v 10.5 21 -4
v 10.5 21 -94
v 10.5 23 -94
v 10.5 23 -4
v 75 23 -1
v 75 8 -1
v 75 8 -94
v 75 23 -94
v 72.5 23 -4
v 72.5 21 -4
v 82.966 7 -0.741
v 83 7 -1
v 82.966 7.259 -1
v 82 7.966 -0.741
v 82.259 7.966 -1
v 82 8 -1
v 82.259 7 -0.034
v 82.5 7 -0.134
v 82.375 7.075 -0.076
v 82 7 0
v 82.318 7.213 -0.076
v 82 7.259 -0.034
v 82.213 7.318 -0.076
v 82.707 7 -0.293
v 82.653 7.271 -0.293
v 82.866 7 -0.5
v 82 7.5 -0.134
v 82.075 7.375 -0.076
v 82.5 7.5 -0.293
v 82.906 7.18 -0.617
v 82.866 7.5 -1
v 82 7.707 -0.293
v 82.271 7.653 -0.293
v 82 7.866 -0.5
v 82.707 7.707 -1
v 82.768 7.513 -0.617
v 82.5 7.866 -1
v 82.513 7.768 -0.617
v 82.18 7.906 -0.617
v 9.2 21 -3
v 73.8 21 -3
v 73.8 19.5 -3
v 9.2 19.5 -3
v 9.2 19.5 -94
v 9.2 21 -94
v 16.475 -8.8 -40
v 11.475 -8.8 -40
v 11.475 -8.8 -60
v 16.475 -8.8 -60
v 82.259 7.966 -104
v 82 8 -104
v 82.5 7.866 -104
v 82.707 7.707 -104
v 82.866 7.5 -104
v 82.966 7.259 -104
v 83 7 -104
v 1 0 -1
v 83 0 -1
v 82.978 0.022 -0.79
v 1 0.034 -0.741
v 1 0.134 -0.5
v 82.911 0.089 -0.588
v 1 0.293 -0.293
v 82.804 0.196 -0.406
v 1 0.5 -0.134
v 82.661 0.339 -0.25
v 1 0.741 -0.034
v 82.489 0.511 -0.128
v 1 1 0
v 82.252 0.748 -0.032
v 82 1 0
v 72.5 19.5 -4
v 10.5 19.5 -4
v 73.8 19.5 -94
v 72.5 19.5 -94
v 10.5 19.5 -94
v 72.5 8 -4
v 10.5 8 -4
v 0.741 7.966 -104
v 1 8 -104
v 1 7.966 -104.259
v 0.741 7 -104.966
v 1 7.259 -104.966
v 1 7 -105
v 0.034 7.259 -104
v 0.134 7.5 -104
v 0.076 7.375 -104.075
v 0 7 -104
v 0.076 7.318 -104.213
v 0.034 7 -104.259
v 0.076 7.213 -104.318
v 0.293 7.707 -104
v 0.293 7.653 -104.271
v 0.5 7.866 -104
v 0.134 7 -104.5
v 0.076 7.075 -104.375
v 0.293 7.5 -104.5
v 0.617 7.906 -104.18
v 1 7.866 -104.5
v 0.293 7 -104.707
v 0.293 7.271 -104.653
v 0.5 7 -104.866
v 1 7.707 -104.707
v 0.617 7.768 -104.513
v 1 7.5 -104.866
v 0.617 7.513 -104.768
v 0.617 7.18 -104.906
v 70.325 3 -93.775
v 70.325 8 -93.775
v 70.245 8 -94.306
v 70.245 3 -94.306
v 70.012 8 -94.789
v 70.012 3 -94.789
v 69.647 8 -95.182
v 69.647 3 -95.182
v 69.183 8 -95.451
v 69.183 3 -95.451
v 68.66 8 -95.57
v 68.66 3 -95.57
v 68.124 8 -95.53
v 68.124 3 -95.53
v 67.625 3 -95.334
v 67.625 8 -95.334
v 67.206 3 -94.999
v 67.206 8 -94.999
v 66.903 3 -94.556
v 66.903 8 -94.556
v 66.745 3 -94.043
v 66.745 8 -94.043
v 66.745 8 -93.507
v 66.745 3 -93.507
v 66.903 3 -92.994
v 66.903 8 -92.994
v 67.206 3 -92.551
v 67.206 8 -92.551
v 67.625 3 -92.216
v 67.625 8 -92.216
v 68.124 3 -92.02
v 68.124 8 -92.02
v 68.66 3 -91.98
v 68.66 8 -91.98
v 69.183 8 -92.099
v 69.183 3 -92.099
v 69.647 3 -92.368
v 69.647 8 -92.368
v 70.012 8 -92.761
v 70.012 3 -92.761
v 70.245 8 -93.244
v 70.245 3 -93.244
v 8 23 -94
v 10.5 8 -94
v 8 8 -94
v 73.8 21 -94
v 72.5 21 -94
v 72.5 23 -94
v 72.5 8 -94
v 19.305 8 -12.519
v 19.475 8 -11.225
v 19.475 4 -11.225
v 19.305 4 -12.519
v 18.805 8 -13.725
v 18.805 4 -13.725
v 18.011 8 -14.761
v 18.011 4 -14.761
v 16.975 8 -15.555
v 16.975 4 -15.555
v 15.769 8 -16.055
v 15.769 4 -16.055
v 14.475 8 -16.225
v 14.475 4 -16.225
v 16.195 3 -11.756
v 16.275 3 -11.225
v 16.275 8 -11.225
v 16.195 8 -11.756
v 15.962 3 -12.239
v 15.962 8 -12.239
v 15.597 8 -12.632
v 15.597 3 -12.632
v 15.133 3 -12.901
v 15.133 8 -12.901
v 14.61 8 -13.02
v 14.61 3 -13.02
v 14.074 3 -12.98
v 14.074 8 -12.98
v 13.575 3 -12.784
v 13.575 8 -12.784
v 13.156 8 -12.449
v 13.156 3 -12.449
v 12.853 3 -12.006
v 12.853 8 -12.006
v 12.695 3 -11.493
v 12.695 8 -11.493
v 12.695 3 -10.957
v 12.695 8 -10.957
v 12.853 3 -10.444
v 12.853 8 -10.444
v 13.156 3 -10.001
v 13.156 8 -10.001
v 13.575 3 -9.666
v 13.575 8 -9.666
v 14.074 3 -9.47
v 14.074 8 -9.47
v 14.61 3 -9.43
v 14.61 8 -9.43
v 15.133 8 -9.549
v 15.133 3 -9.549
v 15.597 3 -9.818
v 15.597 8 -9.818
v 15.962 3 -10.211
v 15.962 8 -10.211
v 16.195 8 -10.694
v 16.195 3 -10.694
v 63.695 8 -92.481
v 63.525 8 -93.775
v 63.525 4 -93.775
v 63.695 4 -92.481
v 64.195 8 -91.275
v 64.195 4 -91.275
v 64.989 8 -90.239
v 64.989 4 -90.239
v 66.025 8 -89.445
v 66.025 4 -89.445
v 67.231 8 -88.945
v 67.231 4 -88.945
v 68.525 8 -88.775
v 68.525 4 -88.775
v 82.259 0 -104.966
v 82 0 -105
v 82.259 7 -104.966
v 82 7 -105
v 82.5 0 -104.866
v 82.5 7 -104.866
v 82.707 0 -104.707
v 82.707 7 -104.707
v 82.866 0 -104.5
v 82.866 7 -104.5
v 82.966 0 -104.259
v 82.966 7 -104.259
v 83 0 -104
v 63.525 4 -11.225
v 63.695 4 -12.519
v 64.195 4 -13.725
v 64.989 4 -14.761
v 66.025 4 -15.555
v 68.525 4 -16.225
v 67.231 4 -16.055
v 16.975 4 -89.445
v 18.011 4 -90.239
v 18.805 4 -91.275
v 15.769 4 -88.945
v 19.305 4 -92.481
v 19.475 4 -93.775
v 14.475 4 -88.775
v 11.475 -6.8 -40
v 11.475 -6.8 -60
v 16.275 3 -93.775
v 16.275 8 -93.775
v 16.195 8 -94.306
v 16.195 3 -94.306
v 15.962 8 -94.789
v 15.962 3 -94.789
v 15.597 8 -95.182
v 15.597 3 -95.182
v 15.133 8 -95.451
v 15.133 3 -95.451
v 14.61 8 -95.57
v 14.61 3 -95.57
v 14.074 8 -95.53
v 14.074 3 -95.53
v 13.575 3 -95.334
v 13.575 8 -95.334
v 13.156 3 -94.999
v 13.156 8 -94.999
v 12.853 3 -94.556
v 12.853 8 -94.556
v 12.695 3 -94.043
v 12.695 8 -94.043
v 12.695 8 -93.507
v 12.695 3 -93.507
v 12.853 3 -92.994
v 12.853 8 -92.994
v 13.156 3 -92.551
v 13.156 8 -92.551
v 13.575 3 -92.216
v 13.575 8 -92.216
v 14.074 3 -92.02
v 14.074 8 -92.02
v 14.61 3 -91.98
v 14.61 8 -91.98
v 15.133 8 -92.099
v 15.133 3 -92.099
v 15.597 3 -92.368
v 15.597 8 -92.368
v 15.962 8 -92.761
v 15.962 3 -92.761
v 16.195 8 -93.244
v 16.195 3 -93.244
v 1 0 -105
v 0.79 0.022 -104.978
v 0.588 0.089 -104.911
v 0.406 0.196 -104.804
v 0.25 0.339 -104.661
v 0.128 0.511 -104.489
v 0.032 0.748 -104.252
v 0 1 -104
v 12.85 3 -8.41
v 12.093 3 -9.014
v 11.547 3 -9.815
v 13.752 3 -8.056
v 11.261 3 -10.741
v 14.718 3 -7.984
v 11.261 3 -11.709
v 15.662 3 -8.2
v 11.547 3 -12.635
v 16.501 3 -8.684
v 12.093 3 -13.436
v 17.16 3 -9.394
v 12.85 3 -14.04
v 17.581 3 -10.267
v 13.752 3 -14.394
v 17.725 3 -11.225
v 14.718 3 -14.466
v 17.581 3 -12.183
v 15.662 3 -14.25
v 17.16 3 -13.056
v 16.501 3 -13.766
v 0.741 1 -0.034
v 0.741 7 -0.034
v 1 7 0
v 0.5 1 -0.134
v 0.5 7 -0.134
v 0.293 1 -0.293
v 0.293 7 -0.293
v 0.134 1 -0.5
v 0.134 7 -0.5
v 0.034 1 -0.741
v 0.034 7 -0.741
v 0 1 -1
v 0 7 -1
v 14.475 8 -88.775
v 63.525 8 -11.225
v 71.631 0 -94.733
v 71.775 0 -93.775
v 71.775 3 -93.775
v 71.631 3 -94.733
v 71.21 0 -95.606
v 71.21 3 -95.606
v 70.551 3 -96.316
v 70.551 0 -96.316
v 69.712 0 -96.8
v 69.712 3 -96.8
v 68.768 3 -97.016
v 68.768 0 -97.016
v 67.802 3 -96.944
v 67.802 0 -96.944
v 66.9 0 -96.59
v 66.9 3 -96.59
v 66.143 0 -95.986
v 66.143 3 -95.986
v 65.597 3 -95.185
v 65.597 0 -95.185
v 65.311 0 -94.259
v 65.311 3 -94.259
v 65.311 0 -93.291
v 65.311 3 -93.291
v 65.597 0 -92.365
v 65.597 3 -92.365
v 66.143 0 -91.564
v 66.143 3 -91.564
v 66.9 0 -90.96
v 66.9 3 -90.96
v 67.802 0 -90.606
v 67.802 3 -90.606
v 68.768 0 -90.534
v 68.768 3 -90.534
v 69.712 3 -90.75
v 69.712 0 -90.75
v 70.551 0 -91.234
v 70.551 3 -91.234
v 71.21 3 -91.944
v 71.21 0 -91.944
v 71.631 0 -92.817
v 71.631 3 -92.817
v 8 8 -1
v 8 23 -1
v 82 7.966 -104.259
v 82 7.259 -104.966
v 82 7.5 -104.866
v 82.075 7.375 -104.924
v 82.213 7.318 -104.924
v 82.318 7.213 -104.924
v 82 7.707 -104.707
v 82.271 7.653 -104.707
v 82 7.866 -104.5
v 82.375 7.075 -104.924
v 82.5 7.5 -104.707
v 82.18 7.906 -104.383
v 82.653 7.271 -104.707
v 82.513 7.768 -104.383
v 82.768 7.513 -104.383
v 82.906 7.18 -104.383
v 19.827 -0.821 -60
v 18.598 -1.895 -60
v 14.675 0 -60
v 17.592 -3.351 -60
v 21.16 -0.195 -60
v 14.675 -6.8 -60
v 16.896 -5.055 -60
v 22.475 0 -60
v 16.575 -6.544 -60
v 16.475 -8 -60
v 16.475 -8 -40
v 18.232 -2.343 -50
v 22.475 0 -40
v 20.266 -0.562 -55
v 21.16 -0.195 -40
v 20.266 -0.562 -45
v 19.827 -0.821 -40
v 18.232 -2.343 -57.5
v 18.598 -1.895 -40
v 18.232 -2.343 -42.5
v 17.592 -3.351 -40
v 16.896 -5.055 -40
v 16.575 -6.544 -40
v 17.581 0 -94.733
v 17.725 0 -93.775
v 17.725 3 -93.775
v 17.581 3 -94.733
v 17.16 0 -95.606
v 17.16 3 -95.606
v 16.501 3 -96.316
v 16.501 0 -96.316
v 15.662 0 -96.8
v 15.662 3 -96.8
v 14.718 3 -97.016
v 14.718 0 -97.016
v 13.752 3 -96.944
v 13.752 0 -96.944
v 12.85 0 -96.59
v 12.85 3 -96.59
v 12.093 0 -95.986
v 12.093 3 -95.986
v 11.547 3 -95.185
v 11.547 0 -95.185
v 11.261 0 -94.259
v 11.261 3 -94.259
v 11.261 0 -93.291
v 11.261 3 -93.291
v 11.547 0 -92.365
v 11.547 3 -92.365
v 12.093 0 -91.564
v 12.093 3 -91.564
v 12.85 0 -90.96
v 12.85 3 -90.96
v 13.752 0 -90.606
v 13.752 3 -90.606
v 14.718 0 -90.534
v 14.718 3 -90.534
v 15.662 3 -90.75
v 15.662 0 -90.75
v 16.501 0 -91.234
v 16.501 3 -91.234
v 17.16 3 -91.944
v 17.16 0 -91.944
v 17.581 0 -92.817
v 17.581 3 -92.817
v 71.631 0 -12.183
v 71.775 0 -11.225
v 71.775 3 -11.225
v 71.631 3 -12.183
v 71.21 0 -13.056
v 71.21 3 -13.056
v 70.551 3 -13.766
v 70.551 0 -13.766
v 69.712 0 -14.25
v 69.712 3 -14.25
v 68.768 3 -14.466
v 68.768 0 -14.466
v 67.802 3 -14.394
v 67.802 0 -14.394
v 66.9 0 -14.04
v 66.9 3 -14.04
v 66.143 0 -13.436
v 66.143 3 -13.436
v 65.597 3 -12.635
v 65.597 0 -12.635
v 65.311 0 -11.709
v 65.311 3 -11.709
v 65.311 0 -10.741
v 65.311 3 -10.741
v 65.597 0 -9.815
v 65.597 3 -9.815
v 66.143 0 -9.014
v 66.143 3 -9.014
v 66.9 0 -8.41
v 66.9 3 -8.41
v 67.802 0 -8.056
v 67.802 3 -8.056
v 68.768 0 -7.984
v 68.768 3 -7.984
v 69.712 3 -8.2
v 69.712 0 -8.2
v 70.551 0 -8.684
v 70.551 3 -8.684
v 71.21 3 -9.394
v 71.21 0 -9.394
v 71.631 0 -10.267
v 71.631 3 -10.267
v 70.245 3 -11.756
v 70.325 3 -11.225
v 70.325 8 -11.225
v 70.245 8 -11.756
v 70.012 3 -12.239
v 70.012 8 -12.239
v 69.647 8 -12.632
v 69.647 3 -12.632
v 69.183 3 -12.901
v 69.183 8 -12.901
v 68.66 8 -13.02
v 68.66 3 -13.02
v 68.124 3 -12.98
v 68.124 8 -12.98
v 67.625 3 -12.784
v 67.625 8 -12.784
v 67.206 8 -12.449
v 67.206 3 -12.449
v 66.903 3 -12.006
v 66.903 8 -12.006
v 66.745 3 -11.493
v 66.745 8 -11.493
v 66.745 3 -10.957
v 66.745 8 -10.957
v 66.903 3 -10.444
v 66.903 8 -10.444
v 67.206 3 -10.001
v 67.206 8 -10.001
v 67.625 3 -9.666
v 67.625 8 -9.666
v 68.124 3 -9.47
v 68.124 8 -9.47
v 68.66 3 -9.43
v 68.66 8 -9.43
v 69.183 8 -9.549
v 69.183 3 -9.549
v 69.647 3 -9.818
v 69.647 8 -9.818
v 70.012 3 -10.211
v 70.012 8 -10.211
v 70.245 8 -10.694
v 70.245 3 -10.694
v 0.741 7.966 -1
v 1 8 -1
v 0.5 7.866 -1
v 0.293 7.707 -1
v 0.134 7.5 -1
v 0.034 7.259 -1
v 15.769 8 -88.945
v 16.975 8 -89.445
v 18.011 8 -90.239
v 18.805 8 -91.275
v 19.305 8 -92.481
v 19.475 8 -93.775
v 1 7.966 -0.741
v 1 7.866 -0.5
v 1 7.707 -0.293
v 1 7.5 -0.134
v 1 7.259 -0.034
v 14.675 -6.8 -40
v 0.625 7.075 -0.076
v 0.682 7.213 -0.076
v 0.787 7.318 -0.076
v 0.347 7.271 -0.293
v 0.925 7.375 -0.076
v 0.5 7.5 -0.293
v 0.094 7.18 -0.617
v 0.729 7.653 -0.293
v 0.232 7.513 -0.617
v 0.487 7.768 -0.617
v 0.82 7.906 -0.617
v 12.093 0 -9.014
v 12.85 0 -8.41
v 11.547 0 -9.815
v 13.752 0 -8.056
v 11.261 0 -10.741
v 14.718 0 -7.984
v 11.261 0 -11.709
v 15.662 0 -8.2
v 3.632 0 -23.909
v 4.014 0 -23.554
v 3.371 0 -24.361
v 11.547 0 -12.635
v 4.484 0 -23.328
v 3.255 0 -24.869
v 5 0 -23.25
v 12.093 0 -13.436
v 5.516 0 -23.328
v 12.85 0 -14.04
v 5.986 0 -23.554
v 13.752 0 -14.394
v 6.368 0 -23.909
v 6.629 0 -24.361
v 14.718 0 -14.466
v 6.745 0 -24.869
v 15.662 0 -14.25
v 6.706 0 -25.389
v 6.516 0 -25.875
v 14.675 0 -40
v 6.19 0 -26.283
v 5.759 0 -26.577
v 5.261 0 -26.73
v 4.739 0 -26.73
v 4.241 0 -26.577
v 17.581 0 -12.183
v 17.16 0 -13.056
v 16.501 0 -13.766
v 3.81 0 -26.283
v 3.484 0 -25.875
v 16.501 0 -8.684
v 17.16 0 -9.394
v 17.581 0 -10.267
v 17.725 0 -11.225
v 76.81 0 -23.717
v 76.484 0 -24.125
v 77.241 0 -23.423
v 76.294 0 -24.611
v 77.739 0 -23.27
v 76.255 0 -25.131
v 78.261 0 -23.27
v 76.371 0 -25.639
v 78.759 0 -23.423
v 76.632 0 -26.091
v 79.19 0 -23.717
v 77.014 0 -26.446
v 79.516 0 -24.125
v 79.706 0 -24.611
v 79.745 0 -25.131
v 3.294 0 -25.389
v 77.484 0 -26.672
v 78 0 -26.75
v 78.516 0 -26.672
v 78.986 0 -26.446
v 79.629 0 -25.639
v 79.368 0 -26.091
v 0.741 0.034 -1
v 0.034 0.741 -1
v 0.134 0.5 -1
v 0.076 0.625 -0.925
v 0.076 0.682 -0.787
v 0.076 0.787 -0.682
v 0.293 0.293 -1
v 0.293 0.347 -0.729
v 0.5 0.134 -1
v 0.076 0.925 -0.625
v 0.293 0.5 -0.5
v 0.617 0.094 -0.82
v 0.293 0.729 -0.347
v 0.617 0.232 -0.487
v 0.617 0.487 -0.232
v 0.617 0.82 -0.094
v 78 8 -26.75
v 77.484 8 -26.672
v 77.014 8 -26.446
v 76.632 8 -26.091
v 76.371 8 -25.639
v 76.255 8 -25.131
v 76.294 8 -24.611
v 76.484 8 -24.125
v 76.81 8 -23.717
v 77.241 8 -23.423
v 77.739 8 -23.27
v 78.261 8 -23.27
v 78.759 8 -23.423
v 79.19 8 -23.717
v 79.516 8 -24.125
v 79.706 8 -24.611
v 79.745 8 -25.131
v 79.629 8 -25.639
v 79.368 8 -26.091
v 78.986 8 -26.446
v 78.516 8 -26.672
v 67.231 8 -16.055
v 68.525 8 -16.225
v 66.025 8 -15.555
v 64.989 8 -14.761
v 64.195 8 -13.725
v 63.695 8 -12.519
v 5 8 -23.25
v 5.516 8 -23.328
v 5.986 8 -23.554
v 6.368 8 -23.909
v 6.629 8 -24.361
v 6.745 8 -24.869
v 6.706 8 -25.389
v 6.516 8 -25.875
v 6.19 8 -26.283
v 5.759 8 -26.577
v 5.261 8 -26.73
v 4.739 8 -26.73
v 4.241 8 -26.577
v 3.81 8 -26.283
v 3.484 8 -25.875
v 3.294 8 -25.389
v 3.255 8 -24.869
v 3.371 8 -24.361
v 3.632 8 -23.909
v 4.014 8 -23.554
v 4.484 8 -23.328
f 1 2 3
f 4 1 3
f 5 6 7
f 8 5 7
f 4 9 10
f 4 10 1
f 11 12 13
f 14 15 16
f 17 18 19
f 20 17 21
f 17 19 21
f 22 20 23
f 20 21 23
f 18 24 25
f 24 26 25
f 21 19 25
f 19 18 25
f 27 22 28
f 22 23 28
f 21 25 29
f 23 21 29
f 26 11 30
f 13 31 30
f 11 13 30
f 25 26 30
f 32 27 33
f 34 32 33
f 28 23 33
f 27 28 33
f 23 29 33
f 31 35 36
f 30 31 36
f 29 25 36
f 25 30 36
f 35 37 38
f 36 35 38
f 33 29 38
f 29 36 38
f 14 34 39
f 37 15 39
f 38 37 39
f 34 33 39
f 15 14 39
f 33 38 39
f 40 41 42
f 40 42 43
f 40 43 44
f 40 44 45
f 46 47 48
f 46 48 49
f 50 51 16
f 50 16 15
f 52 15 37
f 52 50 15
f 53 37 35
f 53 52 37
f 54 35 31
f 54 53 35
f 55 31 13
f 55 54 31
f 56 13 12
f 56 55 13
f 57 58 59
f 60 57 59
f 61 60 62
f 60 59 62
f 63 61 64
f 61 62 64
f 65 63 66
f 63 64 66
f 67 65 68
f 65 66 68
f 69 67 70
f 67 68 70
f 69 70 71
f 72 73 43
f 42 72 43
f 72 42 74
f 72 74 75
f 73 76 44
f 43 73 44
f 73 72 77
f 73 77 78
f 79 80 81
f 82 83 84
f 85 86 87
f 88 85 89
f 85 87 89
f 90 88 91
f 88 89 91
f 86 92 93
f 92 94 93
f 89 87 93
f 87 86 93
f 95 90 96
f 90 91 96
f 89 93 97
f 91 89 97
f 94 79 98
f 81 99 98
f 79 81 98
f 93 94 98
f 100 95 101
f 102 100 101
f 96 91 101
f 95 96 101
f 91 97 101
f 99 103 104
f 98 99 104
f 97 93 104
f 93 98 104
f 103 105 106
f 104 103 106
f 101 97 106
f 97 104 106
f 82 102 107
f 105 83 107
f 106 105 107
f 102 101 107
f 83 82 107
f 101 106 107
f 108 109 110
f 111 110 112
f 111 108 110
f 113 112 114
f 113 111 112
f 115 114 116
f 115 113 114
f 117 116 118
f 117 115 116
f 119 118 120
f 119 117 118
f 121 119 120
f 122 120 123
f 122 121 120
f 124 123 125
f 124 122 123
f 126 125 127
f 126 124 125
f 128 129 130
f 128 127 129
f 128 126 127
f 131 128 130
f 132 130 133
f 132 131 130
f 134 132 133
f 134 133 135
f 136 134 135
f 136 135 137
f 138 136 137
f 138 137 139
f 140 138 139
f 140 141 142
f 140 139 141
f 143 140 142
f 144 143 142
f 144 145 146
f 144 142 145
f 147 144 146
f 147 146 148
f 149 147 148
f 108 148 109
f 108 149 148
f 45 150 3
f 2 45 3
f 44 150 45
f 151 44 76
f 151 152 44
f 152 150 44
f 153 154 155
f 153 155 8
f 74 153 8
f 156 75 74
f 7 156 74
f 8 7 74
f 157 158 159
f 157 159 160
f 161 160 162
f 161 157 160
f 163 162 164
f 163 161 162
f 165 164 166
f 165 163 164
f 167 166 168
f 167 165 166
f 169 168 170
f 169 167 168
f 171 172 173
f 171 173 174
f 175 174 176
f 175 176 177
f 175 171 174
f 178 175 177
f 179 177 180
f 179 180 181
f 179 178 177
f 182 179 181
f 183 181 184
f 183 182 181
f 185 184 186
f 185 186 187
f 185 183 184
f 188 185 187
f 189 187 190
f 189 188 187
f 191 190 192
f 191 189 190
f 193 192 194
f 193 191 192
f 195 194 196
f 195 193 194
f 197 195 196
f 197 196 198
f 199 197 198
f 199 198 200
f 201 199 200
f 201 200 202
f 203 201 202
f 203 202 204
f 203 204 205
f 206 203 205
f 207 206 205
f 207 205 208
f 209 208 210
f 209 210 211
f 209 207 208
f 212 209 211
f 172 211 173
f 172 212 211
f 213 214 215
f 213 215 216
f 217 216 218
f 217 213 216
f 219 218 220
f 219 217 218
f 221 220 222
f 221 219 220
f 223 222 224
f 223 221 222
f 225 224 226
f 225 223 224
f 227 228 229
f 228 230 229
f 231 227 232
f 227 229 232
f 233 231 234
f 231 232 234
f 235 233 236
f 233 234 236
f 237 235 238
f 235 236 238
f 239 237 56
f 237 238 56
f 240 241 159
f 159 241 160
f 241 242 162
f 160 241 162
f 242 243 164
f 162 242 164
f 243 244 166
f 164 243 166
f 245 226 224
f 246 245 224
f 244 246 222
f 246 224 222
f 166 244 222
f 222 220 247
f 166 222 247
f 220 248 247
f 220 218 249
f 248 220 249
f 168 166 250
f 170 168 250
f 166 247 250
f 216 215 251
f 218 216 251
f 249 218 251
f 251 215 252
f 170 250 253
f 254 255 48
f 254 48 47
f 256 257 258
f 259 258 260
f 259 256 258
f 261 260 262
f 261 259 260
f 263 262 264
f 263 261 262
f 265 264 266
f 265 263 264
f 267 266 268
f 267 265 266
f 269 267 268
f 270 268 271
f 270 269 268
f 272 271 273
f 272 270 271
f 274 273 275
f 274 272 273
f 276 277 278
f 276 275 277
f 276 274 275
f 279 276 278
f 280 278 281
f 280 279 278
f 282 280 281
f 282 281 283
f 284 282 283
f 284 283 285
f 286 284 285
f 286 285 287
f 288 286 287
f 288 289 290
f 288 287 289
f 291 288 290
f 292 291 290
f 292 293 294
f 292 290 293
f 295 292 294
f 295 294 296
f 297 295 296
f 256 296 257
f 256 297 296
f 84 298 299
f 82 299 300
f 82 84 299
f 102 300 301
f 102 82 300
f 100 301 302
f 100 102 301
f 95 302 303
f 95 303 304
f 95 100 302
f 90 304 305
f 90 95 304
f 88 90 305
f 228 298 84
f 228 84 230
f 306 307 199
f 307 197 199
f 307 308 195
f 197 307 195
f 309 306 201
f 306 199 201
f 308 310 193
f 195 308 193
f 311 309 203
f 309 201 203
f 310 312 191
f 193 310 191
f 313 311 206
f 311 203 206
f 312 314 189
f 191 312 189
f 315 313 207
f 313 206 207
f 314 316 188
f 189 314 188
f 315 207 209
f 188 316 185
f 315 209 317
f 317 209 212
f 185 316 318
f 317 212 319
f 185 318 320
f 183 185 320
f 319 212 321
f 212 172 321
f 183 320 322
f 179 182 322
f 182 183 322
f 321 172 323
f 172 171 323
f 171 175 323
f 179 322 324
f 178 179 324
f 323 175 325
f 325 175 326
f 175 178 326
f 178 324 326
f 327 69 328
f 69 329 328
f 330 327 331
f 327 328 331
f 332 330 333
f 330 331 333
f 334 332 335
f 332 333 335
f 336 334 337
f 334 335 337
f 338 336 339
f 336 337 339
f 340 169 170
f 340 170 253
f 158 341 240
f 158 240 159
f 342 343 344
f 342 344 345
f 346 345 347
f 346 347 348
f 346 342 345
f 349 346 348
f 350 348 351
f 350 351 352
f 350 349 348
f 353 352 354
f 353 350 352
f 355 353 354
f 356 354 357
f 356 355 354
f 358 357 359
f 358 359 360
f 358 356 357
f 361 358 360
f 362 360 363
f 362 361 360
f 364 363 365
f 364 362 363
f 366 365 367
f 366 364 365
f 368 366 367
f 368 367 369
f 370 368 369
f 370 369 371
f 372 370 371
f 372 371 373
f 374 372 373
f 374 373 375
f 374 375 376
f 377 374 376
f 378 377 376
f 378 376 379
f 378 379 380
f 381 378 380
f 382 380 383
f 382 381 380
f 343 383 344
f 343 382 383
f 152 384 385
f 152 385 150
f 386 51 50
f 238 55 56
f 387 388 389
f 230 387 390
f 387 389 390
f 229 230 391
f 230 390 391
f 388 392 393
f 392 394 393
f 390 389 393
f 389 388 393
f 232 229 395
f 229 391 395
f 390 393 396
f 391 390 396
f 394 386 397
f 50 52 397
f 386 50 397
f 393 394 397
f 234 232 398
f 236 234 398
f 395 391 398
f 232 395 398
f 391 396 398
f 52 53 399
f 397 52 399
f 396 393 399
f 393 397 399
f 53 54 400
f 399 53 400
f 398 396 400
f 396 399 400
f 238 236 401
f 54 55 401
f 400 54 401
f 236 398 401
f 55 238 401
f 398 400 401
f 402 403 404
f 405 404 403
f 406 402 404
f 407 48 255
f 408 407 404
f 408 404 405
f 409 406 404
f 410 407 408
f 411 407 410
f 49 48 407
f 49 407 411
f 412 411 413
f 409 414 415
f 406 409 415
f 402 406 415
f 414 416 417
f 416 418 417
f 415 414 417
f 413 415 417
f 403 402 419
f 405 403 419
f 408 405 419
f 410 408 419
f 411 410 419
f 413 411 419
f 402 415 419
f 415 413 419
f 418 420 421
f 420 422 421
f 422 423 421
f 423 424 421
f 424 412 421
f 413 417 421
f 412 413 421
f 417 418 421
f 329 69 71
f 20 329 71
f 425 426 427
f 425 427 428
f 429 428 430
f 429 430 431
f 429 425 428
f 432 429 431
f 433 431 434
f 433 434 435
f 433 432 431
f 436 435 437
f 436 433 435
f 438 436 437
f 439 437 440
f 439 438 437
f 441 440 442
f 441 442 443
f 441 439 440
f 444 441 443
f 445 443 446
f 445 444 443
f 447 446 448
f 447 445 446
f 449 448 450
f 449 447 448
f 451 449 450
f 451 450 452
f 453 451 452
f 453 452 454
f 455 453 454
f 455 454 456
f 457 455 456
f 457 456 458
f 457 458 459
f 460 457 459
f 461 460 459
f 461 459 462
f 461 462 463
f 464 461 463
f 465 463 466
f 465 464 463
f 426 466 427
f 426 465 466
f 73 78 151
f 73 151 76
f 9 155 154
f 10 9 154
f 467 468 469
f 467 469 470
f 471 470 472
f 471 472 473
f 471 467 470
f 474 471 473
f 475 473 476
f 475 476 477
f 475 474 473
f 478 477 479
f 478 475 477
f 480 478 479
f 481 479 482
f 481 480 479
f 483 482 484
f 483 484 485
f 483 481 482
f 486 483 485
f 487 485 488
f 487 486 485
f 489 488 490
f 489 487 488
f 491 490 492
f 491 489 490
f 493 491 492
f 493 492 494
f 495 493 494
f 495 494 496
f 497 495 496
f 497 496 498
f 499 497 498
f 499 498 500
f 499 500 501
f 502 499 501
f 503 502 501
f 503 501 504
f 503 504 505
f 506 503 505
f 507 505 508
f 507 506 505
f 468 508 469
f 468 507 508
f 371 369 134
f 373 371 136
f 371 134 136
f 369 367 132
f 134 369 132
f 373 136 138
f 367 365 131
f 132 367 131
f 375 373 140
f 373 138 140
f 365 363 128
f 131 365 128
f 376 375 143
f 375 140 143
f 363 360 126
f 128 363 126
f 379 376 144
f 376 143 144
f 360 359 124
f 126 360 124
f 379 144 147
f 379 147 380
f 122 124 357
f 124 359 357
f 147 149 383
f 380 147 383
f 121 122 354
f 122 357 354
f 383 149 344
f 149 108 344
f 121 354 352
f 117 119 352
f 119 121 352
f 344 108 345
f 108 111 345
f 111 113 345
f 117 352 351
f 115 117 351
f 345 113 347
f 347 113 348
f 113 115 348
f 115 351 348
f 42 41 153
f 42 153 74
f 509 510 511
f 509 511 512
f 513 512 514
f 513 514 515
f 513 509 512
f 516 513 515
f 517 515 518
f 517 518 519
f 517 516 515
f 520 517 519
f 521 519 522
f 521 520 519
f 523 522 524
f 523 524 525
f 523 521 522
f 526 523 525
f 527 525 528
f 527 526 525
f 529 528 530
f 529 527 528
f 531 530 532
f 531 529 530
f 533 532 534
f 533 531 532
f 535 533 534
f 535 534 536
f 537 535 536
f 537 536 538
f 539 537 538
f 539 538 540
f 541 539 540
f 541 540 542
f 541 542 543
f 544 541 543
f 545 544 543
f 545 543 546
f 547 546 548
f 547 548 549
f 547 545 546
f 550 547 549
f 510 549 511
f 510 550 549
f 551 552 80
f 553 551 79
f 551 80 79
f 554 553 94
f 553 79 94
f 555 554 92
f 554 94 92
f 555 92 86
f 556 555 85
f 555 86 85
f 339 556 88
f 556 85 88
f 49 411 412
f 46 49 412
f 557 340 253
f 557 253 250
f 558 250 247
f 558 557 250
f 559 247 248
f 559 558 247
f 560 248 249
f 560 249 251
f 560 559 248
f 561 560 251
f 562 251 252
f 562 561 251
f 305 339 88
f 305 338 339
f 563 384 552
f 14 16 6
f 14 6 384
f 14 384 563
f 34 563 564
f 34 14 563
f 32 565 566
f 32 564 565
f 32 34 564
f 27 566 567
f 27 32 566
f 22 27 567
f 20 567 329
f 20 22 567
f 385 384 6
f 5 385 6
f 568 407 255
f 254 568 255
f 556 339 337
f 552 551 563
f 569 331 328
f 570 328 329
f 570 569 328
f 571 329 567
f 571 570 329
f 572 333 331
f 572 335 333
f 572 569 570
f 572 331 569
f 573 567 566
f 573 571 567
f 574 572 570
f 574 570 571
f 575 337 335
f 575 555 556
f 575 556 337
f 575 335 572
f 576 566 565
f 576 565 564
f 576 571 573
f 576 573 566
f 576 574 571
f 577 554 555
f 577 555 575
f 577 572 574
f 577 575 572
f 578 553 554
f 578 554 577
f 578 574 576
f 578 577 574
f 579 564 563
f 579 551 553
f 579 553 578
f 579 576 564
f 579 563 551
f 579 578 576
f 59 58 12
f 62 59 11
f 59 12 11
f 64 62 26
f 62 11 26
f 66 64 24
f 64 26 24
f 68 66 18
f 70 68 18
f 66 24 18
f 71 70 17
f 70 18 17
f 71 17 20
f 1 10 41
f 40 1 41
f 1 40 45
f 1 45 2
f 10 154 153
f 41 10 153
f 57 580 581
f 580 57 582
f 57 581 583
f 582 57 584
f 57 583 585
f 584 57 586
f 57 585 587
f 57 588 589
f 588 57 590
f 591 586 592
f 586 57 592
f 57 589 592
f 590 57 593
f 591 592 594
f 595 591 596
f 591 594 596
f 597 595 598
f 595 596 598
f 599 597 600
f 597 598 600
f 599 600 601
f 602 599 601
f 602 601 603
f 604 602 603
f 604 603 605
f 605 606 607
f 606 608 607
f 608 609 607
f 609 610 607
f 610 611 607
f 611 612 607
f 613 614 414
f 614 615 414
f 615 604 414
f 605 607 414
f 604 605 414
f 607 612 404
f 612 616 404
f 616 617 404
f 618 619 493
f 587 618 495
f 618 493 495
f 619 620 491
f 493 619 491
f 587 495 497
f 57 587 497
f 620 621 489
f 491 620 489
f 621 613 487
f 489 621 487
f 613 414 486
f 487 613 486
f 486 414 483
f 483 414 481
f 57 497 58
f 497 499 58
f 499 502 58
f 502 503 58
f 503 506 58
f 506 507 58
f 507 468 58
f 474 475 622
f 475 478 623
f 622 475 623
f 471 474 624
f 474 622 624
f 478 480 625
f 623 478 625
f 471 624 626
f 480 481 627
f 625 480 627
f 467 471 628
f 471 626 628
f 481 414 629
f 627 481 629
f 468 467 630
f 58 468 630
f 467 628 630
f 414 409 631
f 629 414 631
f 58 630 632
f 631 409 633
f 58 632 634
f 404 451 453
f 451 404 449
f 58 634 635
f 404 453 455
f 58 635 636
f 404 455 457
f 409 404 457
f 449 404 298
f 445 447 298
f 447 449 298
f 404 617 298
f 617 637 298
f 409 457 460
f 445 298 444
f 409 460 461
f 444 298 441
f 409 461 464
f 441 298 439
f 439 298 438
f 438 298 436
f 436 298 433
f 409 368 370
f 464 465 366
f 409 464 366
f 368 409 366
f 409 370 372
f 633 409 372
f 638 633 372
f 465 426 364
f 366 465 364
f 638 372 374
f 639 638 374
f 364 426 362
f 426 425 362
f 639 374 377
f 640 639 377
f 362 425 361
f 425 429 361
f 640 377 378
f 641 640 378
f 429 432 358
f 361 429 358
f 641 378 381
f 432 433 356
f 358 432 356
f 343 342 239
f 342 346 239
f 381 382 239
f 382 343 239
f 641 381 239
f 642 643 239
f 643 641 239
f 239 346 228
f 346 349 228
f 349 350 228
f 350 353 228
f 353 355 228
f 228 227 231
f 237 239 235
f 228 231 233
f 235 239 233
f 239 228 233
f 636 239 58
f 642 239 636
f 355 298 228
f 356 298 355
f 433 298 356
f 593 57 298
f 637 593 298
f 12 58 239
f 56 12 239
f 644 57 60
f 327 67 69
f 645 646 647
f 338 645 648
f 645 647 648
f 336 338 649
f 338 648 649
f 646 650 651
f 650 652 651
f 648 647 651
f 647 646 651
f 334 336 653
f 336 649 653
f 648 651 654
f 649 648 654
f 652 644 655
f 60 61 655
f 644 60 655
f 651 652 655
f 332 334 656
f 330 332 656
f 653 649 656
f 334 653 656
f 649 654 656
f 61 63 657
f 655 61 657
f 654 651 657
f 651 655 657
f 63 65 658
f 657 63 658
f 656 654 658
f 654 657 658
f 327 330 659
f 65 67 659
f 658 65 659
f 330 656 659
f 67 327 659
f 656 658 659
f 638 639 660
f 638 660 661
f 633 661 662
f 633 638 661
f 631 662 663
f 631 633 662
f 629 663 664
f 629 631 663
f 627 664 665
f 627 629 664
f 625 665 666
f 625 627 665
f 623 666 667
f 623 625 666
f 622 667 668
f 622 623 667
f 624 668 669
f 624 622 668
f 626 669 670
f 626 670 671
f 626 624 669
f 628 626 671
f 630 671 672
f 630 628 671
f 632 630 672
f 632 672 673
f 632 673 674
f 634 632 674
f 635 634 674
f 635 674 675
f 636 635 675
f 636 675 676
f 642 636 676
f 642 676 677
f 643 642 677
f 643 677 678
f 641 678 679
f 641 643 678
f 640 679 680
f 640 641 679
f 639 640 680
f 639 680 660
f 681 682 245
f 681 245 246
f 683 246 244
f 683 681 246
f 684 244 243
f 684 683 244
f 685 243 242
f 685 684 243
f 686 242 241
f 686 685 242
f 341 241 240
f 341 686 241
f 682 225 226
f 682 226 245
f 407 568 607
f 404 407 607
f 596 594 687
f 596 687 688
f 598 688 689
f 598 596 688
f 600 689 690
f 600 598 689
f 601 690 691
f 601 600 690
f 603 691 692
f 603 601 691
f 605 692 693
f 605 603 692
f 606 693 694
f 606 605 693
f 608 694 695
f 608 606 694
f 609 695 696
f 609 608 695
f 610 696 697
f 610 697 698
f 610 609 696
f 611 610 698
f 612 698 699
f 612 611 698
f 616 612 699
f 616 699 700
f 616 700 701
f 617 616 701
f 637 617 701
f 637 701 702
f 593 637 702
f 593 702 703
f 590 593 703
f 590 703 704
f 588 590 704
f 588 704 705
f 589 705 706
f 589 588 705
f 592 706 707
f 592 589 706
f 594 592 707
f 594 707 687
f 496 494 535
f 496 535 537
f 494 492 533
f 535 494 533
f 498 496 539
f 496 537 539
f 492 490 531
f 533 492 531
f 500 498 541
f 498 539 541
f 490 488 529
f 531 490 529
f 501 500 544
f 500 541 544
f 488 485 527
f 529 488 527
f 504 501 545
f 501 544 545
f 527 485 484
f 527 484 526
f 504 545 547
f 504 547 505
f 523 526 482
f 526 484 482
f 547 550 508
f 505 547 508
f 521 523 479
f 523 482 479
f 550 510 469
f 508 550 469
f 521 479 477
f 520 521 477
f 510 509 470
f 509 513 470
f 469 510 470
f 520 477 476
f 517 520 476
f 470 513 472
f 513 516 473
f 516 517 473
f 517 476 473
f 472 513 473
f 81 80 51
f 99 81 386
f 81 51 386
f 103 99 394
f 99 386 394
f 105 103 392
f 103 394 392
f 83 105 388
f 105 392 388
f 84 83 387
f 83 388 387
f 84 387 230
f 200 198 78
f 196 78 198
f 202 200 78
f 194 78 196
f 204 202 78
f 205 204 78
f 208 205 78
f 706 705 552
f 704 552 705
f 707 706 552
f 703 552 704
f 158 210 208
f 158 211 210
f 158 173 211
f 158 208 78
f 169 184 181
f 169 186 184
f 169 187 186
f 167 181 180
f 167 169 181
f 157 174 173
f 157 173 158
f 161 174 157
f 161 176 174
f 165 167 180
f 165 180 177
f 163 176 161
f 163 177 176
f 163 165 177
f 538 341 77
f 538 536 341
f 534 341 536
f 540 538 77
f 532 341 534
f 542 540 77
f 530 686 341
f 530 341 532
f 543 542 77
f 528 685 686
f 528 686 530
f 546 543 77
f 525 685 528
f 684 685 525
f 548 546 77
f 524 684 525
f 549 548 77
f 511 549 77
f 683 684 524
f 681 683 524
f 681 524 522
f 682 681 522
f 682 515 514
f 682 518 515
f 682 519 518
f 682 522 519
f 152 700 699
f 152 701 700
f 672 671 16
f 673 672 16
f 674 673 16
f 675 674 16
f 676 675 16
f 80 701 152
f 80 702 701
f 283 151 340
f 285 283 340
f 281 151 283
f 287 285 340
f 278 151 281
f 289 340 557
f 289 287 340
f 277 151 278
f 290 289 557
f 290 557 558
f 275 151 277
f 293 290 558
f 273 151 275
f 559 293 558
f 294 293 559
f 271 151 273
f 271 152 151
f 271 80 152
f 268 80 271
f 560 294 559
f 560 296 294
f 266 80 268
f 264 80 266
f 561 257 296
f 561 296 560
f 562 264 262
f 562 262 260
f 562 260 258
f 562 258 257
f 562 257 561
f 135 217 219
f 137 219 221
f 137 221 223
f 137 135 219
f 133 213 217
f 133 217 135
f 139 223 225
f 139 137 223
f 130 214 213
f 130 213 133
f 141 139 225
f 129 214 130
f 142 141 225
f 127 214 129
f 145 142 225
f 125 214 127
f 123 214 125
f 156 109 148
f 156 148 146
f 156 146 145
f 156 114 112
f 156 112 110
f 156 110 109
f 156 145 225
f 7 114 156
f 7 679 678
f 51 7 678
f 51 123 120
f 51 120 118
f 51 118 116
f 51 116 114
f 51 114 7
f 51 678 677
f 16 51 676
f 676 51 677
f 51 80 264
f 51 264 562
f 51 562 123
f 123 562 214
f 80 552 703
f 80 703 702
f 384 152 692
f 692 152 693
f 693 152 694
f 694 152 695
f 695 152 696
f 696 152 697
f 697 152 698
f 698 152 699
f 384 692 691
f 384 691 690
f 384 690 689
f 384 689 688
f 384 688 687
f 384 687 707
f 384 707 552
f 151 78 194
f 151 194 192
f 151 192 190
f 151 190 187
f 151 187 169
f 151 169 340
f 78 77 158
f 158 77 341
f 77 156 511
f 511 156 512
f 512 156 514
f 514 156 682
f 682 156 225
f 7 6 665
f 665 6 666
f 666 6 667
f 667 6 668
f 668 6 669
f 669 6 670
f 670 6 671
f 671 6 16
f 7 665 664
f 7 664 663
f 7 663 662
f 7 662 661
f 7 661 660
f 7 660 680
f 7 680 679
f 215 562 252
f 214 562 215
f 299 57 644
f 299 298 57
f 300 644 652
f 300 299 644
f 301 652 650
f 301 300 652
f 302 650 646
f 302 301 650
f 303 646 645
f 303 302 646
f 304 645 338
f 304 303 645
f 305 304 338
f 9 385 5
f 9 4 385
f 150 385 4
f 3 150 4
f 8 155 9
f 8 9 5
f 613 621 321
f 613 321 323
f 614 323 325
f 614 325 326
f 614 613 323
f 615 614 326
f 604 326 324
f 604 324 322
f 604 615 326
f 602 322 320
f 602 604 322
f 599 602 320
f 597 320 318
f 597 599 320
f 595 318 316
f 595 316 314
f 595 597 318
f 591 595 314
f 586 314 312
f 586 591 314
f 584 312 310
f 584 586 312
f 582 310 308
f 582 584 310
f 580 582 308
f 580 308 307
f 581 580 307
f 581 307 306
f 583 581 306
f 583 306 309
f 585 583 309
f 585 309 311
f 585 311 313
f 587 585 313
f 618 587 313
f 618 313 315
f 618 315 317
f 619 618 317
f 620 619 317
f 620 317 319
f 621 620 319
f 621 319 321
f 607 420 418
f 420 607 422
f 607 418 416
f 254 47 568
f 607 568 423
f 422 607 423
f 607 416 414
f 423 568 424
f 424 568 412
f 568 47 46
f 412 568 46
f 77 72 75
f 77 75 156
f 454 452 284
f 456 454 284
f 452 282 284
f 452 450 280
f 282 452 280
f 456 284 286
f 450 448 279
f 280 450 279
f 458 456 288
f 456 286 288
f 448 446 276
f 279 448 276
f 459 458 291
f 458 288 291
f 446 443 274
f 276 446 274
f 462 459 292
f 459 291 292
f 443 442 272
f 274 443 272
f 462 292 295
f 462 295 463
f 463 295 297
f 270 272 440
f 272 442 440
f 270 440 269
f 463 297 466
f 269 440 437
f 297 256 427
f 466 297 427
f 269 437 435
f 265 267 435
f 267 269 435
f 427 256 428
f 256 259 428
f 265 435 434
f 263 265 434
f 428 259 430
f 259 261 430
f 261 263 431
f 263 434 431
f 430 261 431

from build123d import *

# Parameters (mm, degrees)
SKETCH1_W                      = 83
SKETCH1_H                      = 105
SKETCH1_R                      = 1.75
BOSS_EXTRUDE1_DEPTH            = 8
CBORE_FOR_M3_SHCS1_OUTLINE_R   = 3.25
CBORE_FOR_M3_SHCS1_DEPTH       = 3
CBORE_START                    = 3
CBORE_FOR_M3_SHCS1_2_OUTLINE_R = 1.8
CBORE_FOR_M3_SHCS1_2_DEPTH     = 5
CUT_EXTRUDE1_DEPTH             = 4
SKETCH6_W                      = 5
SKETCH6_H                      = 20
BOSS_EXTRUDE2_DEPTH            = 8.8
SKETCH7_W                      = 3.2
SKETCH7_H                      = 6.8
CUT_EXTRUDE2_DEPTH             = 103.793190436
FILLET1_SIZE                   = 6
FILLET1_SIZE_2                 = 8
FILLET2_R                      = 1
SKETCH8_W                      = 67
SKETCH8_H                      = 93
BOSS_EXTRUDE4_DEPTH            = 15
CUT_EXTRUDE3_DEPTH             = 90
SKETCH12_W                     = 64.6
SKETCH12_H                     = 1.5
CUT_EXTRUDE4_DEPTH             = 1


# Read off the part's stored shape, not the designer's step: CBORE for M3 SHCS1
with BuildPart() as part:
    # Sketch1 → Boss-Extrude1 (new body)
    with BuildSketch(Plane(origin=(0, 0, 0), x_dir=(1, 0, 0), z_dir=(0, 1, 0))):
        with Locations((41.5, 52.5)):
            Rectangle(SKETCH1_W, SKETCH1_H)
        with Locations(Location((5, 25, 0), (0, 0, 270))):
            Circle(SKETCH1_R, mode=Mode.SUBTRACT)
        with Locations(Location((78, 25, 0), (0, 0, 90))):
            Circle(SKETCH1_R, mode=Mode.SUBTRACT)
    extrude(amount=BOSS_EXTRUDE1_DEPTH)

    # CBORE for M3 SHCS1 outline → CBORE for M3 SHCS1 (cut)
    with BuildSketch(Plane(origin=(0, 0, 0), x_dir=(1, 0, 0), z_dir=(0, 1, 0))):
        with Locations((14.475, 93.775)):
            Circle(CBORE_FOR_M3_SHCS1_OUTLINE_R)
        with Locations((68.525, 93.775)):
            Circle(CBORE_FOR_M3_SHCS1_OUTLINE_R)
        with Locations((68.525, 11.225)):
            Circle(CBORE_FOR_M3_SHCS1_OUTLINE_R)
        with Locations((14.475, 11.225)):
            Circle(CBORE_FOR_M3_SHCS1_OUTLINE_R)
    extrude(amount=CBORE_FOR_M3_SHCS1_DEPTH, mode=Mode.SUBTRACT)

    # CBORE for M3 SHCS1 2 outline → CBORE for M3 SHCS1 2 (cut)
    with BuildSketch(Plane(origin=(0, 0, 0), x_dir=(1, 0, 0), z_dir=(0, 1, 0)).offset(CBORE_START)):
        with Locations((14.475, 93.775)):
            Circle(CBORE_FOR_M3_SHCS1_2_OUTLINE_R)
        with Locations((68.525, 93.775)):
            Circle(CBORE_FOR_M3_SHCS1_2_OUTLINE_R)
        with Locations((68.525, 11.225)):
            Circle(CBORE_FOR_M3_SHCS1_2_OUTLINE_R)
        with Locations((14.475, 11.225)):
            Circle(CBORE_FOR_M3_SHCS1_2_OUTLINE_R)
    extrude(amount=CBORE_FOR_M3_SHCS1_2_DEPTH, mode=Mode.SUBTRACT)

    # Sketch5 → Cut-Extrude1 (cut)
    with BuildSketch(Plane(origin=(0, 8, 0), x_dir=(1, 0, 0), z_dir=(0, 1, 0))):
        with BuildLine():
            Line((19.475, 93.775), (63.525, 93.775))
            ThreePointArc((63.525, 93.775), (64.989466094, 90.239466094), (68.525, 88.775))
            Line((68.525, 88.775), (68.525, 16.225))
            ThreePointArc((68.525, 16.225), (64.989466094, 14.760533906), (63.525, 11.225))
            Line((63.525, 11.225), (19.475, 11.225))
            ThreePointArc((19.475, 11.225), (18.010533906, 14.760533906), (14.475, 16.225))
            Line((14.475, 16.225), (14.475, 88.775))
            ThreePointArc((14.475, 88.775), (18.010533906, 90.239466094), (19.475, 93.775))
        make_face()
    extrude(amount=-CUT_EXTRUDE1_DEPTH, mode=Mode.SUBTRACT)

    # Sketch6 → Boss-Extrude2 (add)
    with BuildSketch(Plane.XZ):
        with Locations((13.975, -50)):
            Rectangle(SKETCH6_W, SKETCH6_H)
    extrude(amount=BOSS_EXTRUDE2_DEPTH)

    # Sketch7 → Cut-Extrude2 (cut, through all)
    with BuildSketch(Plane(origin=(0, 0, -60), x_dir=(-1, 0, 0), z_dir=(0, 0, -1))):
        with Locations((-13.075, -3.4)):
            Rectangle(SKETCH7_W, SKETCH7_H)
    extrude(amount=-CUT_EXTRUDE2_DEPTH, mode=Mode.SUBTRACT)

    # Fillet1
    # an asymmetric fillet: 8, 6 mm, written as the material it adds along each edge
    with BuildSketch(Plane(origin=(16.475, 0, -40), x_dir=(1, 0, 0), z_dir=(0, 0, -1))) as fillet1_piece_1:
        with BuildLine():
            Bezier((FILLET1_SIZE, 0), (0, 0), (0, FILLET1_SIZE_2), weights=[1, 0.707106781, 1])
            Line((0, FILLET1_SIZE_2), (0, 0))
            Line((0, 0), (FILLET1_SIZE, 0))
        make_face()
    extrude(amount=20)

    # Fillet2
    fillet2_edges = [part.edges().sort_by_distance(p)[0] for p in [
        (83, 8, -52.5),
        (41.5, 8, -105),
        (0, 8, -52.5),
        (41.5, 0, 0),
        (0, 0, -52.5),
        (0, 4, -105),
        (83, 4, -105),
        (83, 4, 0),
        (0, 4, 0),
        (41.5, 8, 0),
    ]]
    fillet(fillet2_edges, radius=FILLET2_R)

    # Sketch8 → Boss-Extrude4 (add)
    with BuildSketch(Plane(origin=(0, 8, 0), x_dir=(1, 0, 0), z_dir=(0, 1, 0))):
        with Locations((41.5, 47.5)):
            Rectangle(SKETCH8_W, SKETCH8_H)
    extrude(amount=BOSS_EXTRUDE4_DEPTH)

    # Sketch11 → Cut-Extrude3 (cut)
    with BuildSketch(Plane(origin=(0, 0, -94), x_dir=(-1, 0, 0), z_dir=(0, 0, -1))):
        Polygon((-72.5, 8), (-10.5, 8), (-10.5, 19.5), (-9.2, 19.5), (-9.2, 21), (-10.5, 21), (-10.5, 23), (-72.5, 23), (-72.5, 21), (-73.8, 21), (-73.8, 19.5), (-72.5, 19.5), align=None)
    extrude(amount=-CUT_EXTRUDE3_DEPTH, mode=Mode.SUBTRACT)

    # Sketch12 → Cut-Extrude4 (cut)
    with BuildSketch(Plane(origin=(0, 0, -4), x_dir=(-1, 0, 0), z_dir=(0, 0, -1))):
        with Locations((-41.5, 20.25)):
            Rectangle(SKETCH12_W, SKETCH12_H)
    extrude(amount=-CUT_EXTRUDE4_DEPTH, mode=Mode.SUBTRACT)


solid = part.part
